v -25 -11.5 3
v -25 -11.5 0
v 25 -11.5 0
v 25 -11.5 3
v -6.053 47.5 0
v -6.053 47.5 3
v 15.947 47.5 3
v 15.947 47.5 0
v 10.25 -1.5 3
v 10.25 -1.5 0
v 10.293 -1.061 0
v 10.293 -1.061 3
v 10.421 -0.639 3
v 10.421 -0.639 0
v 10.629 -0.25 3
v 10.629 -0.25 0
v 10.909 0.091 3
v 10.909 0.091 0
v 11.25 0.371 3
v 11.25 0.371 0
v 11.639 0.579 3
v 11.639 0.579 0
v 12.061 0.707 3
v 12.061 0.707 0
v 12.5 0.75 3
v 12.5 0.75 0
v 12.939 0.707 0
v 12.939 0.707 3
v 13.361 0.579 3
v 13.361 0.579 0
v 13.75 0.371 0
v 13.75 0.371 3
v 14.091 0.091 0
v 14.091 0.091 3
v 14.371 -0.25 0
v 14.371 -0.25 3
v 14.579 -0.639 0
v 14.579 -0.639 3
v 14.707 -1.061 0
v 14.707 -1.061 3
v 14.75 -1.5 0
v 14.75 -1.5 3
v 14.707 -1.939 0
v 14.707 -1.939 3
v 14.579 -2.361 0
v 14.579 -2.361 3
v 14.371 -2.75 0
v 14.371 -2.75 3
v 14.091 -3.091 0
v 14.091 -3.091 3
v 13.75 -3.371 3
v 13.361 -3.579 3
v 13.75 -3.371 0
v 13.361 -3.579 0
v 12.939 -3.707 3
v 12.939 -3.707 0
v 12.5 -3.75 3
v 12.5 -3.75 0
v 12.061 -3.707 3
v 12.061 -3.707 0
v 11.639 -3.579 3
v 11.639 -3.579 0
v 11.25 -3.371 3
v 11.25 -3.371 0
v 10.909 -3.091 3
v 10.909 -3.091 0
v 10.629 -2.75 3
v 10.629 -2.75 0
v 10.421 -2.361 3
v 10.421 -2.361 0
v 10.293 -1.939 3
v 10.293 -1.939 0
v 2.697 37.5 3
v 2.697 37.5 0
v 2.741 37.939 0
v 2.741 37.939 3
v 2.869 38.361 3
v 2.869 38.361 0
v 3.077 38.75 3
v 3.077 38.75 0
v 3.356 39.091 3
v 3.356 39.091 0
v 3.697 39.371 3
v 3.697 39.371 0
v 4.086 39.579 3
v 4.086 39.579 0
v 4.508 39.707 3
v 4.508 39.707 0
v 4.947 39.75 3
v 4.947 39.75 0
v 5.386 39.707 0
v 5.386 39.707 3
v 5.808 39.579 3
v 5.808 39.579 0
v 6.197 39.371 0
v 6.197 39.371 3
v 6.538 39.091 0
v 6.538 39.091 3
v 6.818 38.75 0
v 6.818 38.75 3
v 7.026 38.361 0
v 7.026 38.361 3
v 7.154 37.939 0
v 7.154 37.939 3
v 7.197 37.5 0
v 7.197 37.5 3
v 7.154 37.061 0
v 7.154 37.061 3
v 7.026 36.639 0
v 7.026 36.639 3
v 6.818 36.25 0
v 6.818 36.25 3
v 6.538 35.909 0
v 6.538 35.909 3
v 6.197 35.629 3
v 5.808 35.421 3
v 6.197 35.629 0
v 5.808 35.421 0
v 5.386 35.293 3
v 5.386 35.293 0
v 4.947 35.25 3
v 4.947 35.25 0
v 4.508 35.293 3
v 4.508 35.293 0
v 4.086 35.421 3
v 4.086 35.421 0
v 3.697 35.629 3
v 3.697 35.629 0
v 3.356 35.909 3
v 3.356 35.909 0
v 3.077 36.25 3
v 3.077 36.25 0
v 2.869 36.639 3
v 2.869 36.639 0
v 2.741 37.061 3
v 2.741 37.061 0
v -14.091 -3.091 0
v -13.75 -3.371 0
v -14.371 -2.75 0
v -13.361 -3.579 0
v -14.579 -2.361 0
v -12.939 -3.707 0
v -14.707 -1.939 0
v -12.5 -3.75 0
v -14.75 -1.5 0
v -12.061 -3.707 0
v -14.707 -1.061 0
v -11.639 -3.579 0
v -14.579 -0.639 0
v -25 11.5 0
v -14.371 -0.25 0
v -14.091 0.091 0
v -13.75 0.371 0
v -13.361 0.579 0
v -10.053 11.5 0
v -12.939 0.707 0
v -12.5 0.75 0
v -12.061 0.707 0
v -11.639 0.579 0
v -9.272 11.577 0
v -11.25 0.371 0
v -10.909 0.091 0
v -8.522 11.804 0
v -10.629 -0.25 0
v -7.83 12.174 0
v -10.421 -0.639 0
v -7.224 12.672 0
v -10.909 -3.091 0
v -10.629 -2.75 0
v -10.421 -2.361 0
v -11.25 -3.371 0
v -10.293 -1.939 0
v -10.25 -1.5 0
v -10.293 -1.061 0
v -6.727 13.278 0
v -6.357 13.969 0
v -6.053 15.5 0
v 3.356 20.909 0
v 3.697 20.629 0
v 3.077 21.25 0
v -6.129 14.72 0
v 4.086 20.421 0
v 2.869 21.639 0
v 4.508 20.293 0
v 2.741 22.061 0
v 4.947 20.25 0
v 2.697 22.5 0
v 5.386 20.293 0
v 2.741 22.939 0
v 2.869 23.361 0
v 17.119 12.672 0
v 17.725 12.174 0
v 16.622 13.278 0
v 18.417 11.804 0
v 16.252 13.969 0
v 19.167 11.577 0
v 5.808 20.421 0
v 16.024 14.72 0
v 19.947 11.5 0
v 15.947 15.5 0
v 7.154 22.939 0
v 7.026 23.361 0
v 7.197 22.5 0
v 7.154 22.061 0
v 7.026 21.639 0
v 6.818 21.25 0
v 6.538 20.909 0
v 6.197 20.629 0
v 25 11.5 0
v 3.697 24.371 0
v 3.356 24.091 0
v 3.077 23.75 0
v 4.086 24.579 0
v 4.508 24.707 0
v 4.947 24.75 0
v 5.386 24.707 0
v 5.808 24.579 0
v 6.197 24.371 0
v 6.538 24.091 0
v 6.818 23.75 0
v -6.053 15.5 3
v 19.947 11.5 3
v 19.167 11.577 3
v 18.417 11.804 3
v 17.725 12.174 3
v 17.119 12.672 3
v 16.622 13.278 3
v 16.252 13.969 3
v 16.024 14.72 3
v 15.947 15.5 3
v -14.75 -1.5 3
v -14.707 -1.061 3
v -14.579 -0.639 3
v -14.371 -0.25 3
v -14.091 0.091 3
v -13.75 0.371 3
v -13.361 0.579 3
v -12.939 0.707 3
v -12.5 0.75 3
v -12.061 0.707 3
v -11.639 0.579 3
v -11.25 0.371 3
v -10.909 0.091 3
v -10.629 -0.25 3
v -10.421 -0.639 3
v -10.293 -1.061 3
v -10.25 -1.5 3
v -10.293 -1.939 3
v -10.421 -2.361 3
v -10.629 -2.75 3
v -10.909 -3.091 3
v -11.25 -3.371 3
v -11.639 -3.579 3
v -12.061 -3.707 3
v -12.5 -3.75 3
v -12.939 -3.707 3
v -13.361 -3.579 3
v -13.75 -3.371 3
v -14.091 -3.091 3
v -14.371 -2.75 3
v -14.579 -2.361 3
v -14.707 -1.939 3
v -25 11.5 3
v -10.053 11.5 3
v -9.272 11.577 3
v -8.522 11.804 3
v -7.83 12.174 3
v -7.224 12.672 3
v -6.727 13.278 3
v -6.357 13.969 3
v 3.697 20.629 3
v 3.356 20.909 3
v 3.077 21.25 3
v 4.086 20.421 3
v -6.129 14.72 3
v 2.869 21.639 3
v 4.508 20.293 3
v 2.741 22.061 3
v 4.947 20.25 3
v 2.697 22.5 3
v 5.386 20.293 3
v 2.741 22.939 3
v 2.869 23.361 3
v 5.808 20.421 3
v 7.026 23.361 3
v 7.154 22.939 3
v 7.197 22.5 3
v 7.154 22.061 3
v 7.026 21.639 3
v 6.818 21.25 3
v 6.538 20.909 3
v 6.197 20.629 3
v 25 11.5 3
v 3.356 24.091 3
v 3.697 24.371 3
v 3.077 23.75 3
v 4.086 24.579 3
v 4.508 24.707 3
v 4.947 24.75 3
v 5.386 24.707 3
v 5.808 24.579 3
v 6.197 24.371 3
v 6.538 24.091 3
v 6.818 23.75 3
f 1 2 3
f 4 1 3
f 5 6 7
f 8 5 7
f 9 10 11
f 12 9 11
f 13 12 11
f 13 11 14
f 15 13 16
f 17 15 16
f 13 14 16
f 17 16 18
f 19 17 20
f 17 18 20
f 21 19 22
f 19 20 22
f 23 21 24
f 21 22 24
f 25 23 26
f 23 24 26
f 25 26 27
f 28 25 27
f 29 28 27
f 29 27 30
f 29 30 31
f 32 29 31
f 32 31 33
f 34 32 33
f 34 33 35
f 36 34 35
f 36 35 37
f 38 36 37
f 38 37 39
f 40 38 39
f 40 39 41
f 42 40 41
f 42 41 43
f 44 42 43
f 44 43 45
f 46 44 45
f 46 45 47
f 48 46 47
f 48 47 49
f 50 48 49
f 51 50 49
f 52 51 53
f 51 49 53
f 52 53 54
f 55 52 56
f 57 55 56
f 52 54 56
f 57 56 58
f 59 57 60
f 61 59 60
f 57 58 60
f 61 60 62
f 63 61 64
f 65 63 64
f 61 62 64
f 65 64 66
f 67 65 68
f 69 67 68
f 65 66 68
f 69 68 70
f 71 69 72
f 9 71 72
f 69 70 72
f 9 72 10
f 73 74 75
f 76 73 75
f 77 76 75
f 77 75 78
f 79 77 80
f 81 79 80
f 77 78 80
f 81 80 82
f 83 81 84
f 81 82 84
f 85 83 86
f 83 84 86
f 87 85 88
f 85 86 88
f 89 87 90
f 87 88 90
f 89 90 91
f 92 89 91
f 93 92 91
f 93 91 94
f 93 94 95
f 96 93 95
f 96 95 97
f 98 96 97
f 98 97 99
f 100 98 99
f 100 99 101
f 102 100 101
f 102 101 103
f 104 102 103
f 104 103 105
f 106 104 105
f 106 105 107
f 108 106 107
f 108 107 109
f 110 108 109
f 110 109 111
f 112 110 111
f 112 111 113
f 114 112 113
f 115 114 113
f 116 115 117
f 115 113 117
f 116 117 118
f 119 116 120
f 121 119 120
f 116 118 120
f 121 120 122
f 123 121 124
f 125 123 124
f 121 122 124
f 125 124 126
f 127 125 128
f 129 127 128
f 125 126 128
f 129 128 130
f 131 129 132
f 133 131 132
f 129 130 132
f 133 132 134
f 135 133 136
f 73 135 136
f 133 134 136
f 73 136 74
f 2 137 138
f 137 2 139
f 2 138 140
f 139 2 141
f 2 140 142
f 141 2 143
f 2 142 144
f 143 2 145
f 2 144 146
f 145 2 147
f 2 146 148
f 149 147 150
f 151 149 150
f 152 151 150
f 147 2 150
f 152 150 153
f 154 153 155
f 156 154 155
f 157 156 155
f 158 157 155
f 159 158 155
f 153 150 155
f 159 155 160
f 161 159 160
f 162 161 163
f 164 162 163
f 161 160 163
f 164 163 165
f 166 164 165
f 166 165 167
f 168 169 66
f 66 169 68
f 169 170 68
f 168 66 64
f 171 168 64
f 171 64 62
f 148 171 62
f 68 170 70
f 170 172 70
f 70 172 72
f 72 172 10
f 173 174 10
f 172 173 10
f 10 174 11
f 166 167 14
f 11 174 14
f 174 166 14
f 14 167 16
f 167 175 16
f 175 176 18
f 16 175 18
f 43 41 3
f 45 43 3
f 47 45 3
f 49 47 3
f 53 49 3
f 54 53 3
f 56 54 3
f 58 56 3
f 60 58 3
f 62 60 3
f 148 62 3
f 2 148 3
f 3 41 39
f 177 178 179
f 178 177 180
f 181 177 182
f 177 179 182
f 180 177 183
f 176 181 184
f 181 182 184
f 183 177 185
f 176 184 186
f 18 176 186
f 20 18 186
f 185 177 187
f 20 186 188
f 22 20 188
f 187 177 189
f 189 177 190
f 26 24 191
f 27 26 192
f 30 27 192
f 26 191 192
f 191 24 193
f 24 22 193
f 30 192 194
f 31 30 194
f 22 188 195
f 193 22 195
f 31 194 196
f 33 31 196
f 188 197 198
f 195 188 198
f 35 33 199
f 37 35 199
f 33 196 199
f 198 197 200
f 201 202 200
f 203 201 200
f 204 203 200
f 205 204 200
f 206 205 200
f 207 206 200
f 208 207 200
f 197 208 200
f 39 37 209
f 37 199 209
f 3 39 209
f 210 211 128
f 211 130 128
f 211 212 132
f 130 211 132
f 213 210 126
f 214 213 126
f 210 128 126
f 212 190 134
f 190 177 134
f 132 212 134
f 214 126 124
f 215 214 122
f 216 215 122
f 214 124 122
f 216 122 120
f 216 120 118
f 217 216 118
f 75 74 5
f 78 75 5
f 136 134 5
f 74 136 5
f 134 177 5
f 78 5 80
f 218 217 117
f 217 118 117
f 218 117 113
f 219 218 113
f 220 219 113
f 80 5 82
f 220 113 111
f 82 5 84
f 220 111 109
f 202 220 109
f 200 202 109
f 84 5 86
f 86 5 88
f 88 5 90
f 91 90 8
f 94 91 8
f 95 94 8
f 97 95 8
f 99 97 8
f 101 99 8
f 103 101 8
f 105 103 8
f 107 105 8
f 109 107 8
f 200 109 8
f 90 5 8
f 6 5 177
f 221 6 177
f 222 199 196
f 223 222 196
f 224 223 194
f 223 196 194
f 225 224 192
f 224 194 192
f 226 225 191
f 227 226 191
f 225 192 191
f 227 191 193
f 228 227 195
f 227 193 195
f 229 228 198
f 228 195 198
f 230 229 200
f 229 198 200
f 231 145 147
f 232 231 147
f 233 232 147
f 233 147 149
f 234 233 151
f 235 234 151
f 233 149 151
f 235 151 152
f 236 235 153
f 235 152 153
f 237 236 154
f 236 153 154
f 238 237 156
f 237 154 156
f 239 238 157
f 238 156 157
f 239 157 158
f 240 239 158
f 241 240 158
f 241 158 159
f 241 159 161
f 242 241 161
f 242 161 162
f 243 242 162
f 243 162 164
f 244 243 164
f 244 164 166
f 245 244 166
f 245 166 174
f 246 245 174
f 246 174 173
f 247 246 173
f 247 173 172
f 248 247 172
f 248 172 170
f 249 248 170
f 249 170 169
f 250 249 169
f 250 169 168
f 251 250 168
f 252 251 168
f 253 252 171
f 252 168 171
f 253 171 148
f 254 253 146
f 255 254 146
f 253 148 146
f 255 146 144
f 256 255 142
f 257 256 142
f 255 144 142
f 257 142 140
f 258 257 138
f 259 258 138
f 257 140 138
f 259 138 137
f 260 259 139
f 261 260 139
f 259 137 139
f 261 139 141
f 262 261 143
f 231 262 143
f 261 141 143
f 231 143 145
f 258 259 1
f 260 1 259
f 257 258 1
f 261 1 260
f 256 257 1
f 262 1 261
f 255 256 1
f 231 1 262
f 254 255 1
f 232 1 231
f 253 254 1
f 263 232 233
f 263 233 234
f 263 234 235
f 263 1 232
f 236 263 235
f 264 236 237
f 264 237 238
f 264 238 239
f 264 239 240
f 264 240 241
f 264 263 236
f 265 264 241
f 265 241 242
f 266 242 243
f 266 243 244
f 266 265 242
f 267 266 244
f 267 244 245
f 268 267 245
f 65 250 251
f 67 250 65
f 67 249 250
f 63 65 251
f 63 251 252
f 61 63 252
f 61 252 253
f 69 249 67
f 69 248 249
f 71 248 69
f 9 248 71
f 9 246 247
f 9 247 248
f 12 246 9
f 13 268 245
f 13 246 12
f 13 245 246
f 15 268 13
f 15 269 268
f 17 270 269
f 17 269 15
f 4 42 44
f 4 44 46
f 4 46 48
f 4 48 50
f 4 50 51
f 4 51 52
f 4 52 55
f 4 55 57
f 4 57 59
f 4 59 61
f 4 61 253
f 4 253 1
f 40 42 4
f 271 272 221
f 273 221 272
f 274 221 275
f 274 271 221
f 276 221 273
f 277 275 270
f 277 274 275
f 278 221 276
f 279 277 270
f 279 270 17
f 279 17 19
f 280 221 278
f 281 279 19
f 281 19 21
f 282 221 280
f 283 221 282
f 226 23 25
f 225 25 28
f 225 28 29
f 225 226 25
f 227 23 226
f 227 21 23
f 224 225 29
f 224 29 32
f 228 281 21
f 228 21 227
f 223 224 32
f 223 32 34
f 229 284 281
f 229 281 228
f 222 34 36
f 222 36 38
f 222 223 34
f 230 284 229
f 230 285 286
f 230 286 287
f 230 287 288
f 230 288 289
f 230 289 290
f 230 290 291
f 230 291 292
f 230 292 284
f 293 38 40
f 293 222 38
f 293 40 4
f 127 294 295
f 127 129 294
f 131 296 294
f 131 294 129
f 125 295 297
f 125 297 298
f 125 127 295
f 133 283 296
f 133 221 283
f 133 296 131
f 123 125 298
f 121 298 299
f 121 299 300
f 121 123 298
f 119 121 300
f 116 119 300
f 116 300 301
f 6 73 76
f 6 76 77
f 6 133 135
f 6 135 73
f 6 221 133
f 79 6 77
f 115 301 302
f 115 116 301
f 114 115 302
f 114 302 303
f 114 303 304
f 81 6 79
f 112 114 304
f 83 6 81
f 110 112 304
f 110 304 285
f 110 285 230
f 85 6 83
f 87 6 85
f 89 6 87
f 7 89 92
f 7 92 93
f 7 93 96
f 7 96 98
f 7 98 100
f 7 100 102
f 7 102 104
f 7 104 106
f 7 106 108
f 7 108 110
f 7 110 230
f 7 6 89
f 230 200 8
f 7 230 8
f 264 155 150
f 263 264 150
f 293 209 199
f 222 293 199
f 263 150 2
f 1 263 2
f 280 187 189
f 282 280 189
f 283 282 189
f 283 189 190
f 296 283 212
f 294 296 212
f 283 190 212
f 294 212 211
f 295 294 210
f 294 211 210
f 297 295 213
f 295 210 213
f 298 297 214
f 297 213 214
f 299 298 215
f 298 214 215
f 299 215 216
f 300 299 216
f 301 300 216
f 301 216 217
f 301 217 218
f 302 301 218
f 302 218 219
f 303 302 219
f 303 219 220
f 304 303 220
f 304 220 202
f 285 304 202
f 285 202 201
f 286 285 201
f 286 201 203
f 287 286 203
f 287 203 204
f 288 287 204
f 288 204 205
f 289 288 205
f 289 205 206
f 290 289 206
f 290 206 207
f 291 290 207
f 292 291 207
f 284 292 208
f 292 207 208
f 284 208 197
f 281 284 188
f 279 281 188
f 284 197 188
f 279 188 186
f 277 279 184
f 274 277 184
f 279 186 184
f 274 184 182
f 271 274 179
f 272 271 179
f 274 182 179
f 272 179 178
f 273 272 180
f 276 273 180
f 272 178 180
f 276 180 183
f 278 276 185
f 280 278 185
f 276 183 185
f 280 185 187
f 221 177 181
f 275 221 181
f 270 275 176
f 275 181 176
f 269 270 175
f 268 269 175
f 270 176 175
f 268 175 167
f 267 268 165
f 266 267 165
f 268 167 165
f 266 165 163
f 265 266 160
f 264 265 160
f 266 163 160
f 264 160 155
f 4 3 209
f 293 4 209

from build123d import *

# Parameters (mm, degrees)
AUFSATZ_LINEAR_AUSTRAGEN1_DEPTH = 3
DURCHGANGSLOCH_F_R_M41_D        = 4.5
DURCHGANGSLOCH_F_R_M42_D        = 4.5
SKIZZE6_W                       = 22
SKIZZE6_H                       = 24
SCHNITT_LINEAR_AUSTRAGEN1_DEPTH = 76.80402364


with BuildPart() as part:
    # Skizze1 → Aufsatz-Linear austragen1 (new body)
    with BuildSketch(Plane.XY):
        with BuildLine():
            Line((-10.0526089, 11.5), (-25, 11.5))
            Line((-25, 11.5), (-25, -11.5))
            Line((-25, -11.5), (25, -11.5))
            Line((25, -11.5), (25, 11.5))
            Line((25, 11.5), (19.9473911, 11.5))
            ThreePointArc((19.9473911, 11.5), (17.118963975, 12.671572875), (15.9473911, 15.5))
            Line((15.9473911, 15.5), (15.9473911, 71.5))
            Line((15.9473911, 71.5), (-6.0526089, 71.5))
            Line((-6.0526089, 71.5), (-6.0526089, 15.5))
            ThreePointArc((-6.0526089, 15.5), (-7.224181775, 12.671572875), (-10.0526089, 11.5))
        make_face()
    extrude(amount=AUFSATZ_LINEAR_AUSTRAGEN1_DEPTH)

    # Durchgangsloch für M41 (through all)
    with Locations(Plane.XY.offset(3)):
        with Locations((4.9473911, 22.5), (4.9473911, 37.5)):
            Hole(DURCHGANGSLOCH_F_R_M41_D / 2)

    # Durchgangsloch für M42 (through all)
    with Locations(Plane.XY.offset(3)):
        with Locations((-12.5, -1.5), (12.5, -1.5)):
            Hole(DURCHGANGSLOCH_F_R_M42_D / 2)

    # Skizze6 → Schnitt-Linear austragen1 (cut, through all)
    with BuildSketch(Plane.XY.offset(3)):
        with Locations((4.9473911, 59.5)):
            Rectangle(SKIZZE6_W, SKIZZE6_H)
    extrude(amount=-SCHNITT_LINEAR_AUSTRAGEN1_DEPTH, mode=Mode.SUBTRACT)


solid = part.part
